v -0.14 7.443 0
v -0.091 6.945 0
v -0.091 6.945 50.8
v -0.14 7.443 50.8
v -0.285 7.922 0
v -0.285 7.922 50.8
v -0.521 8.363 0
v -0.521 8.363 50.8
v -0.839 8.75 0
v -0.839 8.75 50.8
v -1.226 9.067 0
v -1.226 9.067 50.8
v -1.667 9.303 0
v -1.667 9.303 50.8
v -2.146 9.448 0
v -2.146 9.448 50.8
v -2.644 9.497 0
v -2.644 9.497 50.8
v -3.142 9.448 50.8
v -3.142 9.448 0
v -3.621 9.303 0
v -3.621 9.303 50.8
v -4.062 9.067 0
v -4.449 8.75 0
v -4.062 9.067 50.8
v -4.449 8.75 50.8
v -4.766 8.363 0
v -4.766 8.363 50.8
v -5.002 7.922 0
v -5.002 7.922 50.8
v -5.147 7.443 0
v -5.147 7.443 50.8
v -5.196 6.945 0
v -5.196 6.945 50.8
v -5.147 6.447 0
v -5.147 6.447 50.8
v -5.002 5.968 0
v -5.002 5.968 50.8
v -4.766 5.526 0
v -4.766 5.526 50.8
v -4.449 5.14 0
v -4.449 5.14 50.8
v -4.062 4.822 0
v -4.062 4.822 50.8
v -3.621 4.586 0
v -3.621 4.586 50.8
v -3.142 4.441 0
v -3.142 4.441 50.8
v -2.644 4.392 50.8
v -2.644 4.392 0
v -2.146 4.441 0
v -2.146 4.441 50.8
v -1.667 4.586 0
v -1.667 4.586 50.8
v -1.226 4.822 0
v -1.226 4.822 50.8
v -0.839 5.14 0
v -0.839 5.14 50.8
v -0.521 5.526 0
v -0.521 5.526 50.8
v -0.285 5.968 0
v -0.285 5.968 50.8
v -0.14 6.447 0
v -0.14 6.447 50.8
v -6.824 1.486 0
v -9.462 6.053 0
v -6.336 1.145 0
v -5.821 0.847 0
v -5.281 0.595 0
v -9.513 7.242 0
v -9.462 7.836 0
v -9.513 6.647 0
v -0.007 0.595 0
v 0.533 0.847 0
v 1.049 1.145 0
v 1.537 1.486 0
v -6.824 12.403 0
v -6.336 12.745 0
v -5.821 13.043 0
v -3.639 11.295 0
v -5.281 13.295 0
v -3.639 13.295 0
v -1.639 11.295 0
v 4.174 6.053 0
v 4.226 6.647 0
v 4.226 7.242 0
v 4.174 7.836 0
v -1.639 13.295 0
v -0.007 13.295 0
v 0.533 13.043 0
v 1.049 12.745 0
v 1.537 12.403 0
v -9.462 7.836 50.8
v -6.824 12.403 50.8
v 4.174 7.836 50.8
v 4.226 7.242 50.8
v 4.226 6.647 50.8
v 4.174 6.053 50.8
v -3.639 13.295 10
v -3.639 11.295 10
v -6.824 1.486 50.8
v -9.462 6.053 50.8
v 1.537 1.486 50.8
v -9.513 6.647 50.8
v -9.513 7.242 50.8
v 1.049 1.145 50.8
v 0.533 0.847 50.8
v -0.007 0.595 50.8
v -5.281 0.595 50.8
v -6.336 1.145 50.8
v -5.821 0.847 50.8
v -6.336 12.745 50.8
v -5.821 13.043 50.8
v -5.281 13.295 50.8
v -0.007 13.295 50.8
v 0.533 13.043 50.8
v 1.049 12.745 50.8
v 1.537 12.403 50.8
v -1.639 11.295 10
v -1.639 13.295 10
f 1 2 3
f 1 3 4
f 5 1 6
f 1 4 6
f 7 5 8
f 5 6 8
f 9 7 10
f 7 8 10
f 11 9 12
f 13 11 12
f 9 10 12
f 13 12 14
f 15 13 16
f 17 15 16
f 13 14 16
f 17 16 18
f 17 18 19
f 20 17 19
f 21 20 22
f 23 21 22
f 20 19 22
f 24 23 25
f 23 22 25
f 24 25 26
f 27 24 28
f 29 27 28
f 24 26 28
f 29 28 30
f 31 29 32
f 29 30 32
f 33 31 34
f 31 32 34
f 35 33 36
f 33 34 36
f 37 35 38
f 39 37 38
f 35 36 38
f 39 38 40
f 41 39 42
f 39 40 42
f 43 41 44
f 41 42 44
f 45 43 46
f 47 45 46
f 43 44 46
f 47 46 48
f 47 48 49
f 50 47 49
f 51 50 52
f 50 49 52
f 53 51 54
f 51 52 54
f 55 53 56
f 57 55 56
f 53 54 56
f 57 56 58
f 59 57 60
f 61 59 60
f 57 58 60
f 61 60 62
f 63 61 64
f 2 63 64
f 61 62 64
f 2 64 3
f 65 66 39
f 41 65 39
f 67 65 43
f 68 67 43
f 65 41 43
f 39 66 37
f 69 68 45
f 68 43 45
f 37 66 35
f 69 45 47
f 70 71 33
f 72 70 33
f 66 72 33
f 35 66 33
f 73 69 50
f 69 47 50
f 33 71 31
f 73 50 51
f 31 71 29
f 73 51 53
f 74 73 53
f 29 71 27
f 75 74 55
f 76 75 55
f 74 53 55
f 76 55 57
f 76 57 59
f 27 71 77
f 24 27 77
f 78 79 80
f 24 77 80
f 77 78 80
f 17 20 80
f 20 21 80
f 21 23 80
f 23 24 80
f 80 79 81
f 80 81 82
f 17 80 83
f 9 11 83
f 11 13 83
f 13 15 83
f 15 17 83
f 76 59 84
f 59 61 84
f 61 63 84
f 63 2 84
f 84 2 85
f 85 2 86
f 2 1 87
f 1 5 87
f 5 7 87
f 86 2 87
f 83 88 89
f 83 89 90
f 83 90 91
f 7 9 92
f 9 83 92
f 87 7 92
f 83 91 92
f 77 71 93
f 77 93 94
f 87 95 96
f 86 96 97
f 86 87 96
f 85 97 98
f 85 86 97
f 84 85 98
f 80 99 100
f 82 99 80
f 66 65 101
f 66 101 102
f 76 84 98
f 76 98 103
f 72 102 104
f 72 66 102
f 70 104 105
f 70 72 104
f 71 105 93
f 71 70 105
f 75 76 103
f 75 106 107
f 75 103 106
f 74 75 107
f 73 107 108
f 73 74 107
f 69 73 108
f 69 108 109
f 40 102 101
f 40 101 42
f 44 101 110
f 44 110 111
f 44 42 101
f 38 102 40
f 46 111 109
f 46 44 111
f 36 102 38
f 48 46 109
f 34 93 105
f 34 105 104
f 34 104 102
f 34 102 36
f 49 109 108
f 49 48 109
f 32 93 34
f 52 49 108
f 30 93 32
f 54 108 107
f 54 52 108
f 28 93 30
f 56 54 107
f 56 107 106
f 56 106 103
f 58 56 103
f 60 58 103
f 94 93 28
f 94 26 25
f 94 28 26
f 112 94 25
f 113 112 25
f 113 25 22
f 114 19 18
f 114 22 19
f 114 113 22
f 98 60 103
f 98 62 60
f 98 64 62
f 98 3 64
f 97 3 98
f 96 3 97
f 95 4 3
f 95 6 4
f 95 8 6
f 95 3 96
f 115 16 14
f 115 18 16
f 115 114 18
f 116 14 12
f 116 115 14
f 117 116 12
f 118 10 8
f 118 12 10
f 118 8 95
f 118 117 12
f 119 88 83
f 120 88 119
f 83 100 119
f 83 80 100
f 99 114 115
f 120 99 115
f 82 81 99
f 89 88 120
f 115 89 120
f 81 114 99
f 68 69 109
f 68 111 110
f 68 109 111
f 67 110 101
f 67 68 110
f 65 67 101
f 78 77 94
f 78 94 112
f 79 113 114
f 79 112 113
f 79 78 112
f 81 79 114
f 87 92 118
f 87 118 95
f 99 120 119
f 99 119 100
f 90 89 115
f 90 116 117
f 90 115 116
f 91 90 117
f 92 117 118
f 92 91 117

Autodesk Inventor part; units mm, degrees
ref_plane "YZ Plane" through (0, 0, 0) normal (1, 0, 0) x (0, 1, 0)
ref_plane "XZ Plane" through (0, 0, 0) normal (0, 1, 0) x (-1, 0, 0)
ref_plane "XY Plane" through (0, 0, 0) normal (0, 0, 1) x (1, 0, 0)
sketch "Sketch1" plane through (0, 0, 0) normal (0, 0, 1) x (1, 0, 0)
  circle A0 centre (-2.6438, 6.9447) radius 6.8758
  line L0 (-9.4616, 7.8359) -> (-6.8245, 12.4034)
  line L1 (-6.8245, 1.4859) -> (-9.4616, 6.0534)
  line L2 (-0.0068, 0.5947) -> (-5.2808, 0.5947)
  line L3 (4.174, 6.0534) -> (1.537, 1.4859)
  line L4 (1.537, 12.4034) -> (4.174, 7.8359)
  line L5 (-5.2808, 13.2947) -> (-0.0068, 13.2947)
  point P0 (0, 0)
  point P1 (1.537, 1.4859)
  dimension "d0" = 13.7516
  dimension "d4" = 360
extrude "Extrusion1" add sketch "Sketch1" along normal blind 50.8 contours A0 L3 L2 L1 L0 L5 L4
sketch "Sketch2" plane through (0, 0, 50.8) normal (0, 0, 1) x (1, 0, 0)
  circle A0 centre (-2.6438, 6.9447) radius 2.5527
  line L0 (-5.2808, 0.5947) -> (-0.0068, 0.5947) projected
  line L1 (-2.6438, 6.9447) -> (-5.2808, 0.5947) construction
  line L2 (-2.6438, 6.9447) -> (-0.0068, 0.5947) construction
  point P0 (0, 0)
  dimension "d8" = 5.1054
  dimension "d9" = 6.35
extrude "Extrusion2" cut sketch "Sketch2" against normal blind 50.8
sketch "Sketch3" plane through (-5.2808, 13.2947, 0) normal (0, 1, 0) x (1, 0, 0)
  line L0 (0, 0) -> (5.274, 0) projected
  line L1 (1.6416, 0) -> (3.6416, 0)
  line L2 (3.6416, 0) -> (3.6416, -10)
  line L3 (3.6416, -10) -> (1.6416, -10)
  line L4 (1.6416, -10) -> (1.6416, 0)
  line L5 (2.6416, -10) -> (2.6416, 0) construction
  line L6 (0, 0) -> (0, -50.8) projected
  line L7 (5.274, 0) -> (5.274, -50.8) projected
  point P0 (5.2808, 0)
  dimension "d12" = 2
  dimension "d13" = 10
  dimension "d14" = 2.6416
extrude "Extrusion3" cut sketch "Sketch3" against normal blind 2
equation "\"d6\" = d5"
equation "\"d10\" = d5"
equation "\"d5\" = 50.8"
properties part number "Thundershaft 2in"
